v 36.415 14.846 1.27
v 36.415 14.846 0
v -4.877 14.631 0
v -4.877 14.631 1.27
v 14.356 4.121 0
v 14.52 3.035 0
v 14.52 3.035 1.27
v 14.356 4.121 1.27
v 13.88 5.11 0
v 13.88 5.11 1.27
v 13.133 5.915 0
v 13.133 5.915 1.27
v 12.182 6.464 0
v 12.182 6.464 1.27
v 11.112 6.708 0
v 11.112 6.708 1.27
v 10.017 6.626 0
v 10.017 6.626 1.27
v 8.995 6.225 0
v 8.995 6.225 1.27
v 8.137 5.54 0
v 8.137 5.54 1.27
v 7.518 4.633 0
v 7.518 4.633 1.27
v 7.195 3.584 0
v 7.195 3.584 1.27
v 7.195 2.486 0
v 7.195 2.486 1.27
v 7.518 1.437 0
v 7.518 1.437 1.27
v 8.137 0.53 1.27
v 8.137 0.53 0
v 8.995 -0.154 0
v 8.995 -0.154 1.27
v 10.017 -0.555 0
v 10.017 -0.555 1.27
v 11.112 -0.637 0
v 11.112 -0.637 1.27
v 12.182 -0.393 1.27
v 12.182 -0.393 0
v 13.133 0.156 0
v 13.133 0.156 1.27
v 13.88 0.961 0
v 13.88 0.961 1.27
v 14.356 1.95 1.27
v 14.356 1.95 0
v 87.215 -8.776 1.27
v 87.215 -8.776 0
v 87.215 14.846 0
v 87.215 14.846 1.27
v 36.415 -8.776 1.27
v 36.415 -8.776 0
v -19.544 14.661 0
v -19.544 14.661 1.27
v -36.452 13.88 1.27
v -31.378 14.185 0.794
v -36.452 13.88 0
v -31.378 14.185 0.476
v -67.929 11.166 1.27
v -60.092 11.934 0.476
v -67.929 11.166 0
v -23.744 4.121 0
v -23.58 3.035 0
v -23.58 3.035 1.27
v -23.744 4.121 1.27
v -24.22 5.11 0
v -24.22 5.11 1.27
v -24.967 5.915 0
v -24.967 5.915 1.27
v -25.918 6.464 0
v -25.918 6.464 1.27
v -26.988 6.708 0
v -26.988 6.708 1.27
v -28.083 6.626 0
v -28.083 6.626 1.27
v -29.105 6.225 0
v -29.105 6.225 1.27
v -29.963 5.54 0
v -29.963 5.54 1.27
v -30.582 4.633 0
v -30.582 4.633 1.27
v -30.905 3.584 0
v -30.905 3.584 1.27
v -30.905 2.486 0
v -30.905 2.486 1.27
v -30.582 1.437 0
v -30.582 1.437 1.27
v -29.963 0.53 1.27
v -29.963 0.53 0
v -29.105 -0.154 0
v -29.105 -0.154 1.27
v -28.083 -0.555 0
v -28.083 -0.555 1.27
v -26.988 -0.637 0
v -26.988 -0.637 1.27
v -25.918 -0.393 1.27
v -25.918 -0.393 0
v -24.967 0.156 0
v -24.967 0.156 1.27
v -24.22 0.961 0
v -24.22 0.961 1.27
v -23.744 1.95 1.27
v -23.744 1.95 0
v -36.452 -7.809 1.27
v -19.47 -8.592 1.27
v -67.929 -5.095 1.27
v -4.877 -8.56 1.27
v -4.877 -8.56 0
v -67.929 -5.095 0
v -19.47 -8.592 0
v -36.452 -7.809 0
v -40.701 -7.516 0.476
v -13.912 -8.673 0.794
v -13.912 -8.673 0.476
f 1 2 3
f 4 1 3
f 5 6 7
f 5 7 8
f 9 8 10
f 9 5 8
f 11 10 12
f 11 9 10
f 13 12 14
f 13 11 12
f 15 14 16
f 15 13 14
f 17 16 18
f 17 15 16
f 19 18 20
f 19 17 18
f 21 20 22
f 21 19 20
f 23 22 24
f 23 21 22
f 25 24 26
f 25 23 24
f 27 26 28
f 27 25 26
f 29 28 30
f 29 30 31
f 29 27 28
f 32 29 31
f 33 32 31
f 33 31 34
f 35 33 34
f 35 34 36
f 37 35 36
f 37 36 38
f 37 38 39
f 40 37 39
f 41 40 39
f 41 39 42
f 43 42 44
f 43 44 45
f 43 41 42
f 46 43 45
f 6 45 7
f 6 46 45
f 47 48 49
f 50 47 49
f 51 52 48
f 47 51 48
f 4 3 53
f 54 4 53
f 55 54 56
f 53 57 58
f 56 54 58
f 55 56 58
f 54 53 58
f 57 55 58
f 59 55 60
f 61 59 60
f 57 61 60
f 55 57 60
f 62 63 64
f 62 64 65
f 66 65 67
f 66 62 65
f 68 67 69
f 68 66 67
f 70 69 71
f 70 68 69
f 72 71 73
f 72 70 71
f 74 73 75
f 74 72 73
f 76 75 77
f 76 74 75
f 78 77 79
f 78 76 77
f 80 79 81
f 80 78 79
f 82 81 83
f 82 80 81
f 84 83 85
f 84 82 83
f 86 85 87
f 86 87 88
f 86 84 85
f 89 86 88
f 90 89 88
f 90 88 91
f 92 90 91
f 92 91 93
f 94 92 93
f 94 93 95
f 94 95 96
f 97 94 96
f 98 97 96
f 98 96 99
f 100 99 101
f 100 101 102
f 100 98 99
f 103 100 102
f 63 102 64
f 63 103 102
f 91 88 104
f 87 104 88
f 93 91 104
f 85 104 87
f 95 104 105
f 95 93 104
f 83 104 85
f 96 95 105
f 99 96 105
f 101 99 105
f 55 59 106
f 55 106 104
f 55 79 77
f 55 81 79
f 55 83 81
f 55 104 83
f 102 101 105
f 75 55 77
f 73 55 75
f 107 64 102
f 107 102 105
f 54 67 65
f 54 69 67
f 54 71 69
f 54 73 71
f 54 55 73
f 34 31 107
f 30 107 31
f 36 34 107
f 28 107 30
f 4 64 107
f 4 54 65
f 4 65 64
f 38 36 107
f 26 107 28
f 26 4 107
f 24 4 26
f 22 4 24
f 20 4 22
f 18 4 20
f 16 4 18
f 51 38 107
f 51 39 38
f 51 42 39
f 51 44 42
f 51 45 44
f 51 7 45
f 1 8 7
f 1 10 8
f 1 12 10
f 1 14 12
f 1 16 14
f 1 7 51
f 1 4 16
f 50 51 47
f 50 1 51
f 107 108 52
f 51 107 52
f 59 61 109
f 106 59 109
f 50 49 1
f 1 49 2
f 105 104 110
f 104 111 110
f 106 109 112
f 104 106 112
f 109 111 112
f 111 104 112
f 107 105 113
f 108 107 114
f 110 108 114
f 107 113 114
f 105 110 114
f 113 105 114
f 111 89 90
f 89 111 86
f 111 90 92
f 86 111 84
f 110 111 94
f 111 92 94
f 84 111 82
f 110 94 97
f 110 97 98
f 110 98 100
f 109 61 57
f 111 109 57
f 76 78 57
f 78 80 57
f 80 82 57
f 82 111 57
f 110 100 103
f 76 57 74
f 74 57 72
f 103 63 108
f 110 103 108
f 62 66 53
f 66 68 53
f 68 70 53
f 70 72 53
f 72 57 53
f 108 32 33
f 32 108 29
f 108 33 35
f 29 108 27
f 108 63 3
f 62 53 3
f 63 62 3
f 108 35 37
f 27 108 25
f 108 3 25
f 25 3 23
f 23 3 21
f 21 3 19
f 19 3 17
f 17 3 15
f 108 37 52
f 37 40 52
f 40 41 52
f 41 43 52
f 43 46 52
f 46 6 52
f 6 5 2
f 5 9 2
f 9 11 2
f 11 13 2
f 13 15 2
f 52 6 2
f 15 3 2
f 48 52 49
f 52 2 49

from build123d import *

# Parameters (mm, degrees)
SKETCH1_R           = 3.683
BOSS_EXTRUDE1_DEPTH = 1.27


with BuildPart() as part:
    # Sketch1 → Boss-Extrude1 (new body)
    with BuildSketch(Plane.XY):
        with BuildLine():
            Line((-67.928698338, 11.165767897), (-67.928698338, -5.09495887))
            add(Edge.make_bspline(
                [(-67.928698338, -5.09495887), (-65.317150891, -5.357271388), (-59.445047559, -5.93539969), (-50.370544126, -6.763807956), (-40.79988194, -7.532686473), (-31.506289085, -8.137699048), (-22.575311372, -8.541135315), (-14.081486566, -8.712534782), (-8.230455293, -8.660353622), (-5.219485256, -8.571038003), (-4.87655586, -8.560021553)],
                knots=[0.615514615, 0.615514615, 0.615514615, 0.615514615, 0.63604571, 0.661669949, 0.686792378, 0.711149584, 0.734517597, 0.75671861, 0.777596499, 0.780280213, 0.780280213, 0.780280213, 0.780280213], degree=3))
            Line((-4.87655586, -8.560021553), (36.414501662, -8.775595487))
            Line((36.414501662, -8.775595487), (87.214501662, -8.775595487))
            Line((87.214501662, -8.775595487), (87.214501662, 14.846404513))
            Line((87.214501662, 14.846404513), (36.414501662, 14.846404513))
            Line((36.414501662, 14.846404513), (-4.87655586, 14.63083058))
            add(Edge.make_bspline(
                [(-4.87655586, 14.63083058), (-5.219485256, 14.64184703), (-8.230455293, 14.731162649), (-14.081486566, 14.783343809), (-22.575311372, 14.611944341), (-31.506289085, 14.208508075), (-40.79988194, 13.6034955), (-50.370544126, 12.834616983), (-59.445047559, 12.006208717), (-65.317150891, 11.428080415), (-67.928698338, 11.165767897)],
                knots=[0.219719787, 0.219719787, 0.219719787, 0.219719787, 0.222403501, 0.24328139, 0.265482403, 0.288850416, 0.313207622, 0.338330051, 0.36395429, 0.384485385, 0.384485385, 0.384485385, 0.384485385], degree=3))
        make_face()
        with Locations((10.836701662, 3.035404513)):
            Circle(SKETCH1_R, mode=Mode.SUBTRACT)
        with Locations((-27.263298338, 3.035404513)):
            Circle(SKETCH1_R, mode=Mode.SUBTRACT)
    extrude(amount=BOSS_EXTRUDE1_DEPTH)


solid = part.part
